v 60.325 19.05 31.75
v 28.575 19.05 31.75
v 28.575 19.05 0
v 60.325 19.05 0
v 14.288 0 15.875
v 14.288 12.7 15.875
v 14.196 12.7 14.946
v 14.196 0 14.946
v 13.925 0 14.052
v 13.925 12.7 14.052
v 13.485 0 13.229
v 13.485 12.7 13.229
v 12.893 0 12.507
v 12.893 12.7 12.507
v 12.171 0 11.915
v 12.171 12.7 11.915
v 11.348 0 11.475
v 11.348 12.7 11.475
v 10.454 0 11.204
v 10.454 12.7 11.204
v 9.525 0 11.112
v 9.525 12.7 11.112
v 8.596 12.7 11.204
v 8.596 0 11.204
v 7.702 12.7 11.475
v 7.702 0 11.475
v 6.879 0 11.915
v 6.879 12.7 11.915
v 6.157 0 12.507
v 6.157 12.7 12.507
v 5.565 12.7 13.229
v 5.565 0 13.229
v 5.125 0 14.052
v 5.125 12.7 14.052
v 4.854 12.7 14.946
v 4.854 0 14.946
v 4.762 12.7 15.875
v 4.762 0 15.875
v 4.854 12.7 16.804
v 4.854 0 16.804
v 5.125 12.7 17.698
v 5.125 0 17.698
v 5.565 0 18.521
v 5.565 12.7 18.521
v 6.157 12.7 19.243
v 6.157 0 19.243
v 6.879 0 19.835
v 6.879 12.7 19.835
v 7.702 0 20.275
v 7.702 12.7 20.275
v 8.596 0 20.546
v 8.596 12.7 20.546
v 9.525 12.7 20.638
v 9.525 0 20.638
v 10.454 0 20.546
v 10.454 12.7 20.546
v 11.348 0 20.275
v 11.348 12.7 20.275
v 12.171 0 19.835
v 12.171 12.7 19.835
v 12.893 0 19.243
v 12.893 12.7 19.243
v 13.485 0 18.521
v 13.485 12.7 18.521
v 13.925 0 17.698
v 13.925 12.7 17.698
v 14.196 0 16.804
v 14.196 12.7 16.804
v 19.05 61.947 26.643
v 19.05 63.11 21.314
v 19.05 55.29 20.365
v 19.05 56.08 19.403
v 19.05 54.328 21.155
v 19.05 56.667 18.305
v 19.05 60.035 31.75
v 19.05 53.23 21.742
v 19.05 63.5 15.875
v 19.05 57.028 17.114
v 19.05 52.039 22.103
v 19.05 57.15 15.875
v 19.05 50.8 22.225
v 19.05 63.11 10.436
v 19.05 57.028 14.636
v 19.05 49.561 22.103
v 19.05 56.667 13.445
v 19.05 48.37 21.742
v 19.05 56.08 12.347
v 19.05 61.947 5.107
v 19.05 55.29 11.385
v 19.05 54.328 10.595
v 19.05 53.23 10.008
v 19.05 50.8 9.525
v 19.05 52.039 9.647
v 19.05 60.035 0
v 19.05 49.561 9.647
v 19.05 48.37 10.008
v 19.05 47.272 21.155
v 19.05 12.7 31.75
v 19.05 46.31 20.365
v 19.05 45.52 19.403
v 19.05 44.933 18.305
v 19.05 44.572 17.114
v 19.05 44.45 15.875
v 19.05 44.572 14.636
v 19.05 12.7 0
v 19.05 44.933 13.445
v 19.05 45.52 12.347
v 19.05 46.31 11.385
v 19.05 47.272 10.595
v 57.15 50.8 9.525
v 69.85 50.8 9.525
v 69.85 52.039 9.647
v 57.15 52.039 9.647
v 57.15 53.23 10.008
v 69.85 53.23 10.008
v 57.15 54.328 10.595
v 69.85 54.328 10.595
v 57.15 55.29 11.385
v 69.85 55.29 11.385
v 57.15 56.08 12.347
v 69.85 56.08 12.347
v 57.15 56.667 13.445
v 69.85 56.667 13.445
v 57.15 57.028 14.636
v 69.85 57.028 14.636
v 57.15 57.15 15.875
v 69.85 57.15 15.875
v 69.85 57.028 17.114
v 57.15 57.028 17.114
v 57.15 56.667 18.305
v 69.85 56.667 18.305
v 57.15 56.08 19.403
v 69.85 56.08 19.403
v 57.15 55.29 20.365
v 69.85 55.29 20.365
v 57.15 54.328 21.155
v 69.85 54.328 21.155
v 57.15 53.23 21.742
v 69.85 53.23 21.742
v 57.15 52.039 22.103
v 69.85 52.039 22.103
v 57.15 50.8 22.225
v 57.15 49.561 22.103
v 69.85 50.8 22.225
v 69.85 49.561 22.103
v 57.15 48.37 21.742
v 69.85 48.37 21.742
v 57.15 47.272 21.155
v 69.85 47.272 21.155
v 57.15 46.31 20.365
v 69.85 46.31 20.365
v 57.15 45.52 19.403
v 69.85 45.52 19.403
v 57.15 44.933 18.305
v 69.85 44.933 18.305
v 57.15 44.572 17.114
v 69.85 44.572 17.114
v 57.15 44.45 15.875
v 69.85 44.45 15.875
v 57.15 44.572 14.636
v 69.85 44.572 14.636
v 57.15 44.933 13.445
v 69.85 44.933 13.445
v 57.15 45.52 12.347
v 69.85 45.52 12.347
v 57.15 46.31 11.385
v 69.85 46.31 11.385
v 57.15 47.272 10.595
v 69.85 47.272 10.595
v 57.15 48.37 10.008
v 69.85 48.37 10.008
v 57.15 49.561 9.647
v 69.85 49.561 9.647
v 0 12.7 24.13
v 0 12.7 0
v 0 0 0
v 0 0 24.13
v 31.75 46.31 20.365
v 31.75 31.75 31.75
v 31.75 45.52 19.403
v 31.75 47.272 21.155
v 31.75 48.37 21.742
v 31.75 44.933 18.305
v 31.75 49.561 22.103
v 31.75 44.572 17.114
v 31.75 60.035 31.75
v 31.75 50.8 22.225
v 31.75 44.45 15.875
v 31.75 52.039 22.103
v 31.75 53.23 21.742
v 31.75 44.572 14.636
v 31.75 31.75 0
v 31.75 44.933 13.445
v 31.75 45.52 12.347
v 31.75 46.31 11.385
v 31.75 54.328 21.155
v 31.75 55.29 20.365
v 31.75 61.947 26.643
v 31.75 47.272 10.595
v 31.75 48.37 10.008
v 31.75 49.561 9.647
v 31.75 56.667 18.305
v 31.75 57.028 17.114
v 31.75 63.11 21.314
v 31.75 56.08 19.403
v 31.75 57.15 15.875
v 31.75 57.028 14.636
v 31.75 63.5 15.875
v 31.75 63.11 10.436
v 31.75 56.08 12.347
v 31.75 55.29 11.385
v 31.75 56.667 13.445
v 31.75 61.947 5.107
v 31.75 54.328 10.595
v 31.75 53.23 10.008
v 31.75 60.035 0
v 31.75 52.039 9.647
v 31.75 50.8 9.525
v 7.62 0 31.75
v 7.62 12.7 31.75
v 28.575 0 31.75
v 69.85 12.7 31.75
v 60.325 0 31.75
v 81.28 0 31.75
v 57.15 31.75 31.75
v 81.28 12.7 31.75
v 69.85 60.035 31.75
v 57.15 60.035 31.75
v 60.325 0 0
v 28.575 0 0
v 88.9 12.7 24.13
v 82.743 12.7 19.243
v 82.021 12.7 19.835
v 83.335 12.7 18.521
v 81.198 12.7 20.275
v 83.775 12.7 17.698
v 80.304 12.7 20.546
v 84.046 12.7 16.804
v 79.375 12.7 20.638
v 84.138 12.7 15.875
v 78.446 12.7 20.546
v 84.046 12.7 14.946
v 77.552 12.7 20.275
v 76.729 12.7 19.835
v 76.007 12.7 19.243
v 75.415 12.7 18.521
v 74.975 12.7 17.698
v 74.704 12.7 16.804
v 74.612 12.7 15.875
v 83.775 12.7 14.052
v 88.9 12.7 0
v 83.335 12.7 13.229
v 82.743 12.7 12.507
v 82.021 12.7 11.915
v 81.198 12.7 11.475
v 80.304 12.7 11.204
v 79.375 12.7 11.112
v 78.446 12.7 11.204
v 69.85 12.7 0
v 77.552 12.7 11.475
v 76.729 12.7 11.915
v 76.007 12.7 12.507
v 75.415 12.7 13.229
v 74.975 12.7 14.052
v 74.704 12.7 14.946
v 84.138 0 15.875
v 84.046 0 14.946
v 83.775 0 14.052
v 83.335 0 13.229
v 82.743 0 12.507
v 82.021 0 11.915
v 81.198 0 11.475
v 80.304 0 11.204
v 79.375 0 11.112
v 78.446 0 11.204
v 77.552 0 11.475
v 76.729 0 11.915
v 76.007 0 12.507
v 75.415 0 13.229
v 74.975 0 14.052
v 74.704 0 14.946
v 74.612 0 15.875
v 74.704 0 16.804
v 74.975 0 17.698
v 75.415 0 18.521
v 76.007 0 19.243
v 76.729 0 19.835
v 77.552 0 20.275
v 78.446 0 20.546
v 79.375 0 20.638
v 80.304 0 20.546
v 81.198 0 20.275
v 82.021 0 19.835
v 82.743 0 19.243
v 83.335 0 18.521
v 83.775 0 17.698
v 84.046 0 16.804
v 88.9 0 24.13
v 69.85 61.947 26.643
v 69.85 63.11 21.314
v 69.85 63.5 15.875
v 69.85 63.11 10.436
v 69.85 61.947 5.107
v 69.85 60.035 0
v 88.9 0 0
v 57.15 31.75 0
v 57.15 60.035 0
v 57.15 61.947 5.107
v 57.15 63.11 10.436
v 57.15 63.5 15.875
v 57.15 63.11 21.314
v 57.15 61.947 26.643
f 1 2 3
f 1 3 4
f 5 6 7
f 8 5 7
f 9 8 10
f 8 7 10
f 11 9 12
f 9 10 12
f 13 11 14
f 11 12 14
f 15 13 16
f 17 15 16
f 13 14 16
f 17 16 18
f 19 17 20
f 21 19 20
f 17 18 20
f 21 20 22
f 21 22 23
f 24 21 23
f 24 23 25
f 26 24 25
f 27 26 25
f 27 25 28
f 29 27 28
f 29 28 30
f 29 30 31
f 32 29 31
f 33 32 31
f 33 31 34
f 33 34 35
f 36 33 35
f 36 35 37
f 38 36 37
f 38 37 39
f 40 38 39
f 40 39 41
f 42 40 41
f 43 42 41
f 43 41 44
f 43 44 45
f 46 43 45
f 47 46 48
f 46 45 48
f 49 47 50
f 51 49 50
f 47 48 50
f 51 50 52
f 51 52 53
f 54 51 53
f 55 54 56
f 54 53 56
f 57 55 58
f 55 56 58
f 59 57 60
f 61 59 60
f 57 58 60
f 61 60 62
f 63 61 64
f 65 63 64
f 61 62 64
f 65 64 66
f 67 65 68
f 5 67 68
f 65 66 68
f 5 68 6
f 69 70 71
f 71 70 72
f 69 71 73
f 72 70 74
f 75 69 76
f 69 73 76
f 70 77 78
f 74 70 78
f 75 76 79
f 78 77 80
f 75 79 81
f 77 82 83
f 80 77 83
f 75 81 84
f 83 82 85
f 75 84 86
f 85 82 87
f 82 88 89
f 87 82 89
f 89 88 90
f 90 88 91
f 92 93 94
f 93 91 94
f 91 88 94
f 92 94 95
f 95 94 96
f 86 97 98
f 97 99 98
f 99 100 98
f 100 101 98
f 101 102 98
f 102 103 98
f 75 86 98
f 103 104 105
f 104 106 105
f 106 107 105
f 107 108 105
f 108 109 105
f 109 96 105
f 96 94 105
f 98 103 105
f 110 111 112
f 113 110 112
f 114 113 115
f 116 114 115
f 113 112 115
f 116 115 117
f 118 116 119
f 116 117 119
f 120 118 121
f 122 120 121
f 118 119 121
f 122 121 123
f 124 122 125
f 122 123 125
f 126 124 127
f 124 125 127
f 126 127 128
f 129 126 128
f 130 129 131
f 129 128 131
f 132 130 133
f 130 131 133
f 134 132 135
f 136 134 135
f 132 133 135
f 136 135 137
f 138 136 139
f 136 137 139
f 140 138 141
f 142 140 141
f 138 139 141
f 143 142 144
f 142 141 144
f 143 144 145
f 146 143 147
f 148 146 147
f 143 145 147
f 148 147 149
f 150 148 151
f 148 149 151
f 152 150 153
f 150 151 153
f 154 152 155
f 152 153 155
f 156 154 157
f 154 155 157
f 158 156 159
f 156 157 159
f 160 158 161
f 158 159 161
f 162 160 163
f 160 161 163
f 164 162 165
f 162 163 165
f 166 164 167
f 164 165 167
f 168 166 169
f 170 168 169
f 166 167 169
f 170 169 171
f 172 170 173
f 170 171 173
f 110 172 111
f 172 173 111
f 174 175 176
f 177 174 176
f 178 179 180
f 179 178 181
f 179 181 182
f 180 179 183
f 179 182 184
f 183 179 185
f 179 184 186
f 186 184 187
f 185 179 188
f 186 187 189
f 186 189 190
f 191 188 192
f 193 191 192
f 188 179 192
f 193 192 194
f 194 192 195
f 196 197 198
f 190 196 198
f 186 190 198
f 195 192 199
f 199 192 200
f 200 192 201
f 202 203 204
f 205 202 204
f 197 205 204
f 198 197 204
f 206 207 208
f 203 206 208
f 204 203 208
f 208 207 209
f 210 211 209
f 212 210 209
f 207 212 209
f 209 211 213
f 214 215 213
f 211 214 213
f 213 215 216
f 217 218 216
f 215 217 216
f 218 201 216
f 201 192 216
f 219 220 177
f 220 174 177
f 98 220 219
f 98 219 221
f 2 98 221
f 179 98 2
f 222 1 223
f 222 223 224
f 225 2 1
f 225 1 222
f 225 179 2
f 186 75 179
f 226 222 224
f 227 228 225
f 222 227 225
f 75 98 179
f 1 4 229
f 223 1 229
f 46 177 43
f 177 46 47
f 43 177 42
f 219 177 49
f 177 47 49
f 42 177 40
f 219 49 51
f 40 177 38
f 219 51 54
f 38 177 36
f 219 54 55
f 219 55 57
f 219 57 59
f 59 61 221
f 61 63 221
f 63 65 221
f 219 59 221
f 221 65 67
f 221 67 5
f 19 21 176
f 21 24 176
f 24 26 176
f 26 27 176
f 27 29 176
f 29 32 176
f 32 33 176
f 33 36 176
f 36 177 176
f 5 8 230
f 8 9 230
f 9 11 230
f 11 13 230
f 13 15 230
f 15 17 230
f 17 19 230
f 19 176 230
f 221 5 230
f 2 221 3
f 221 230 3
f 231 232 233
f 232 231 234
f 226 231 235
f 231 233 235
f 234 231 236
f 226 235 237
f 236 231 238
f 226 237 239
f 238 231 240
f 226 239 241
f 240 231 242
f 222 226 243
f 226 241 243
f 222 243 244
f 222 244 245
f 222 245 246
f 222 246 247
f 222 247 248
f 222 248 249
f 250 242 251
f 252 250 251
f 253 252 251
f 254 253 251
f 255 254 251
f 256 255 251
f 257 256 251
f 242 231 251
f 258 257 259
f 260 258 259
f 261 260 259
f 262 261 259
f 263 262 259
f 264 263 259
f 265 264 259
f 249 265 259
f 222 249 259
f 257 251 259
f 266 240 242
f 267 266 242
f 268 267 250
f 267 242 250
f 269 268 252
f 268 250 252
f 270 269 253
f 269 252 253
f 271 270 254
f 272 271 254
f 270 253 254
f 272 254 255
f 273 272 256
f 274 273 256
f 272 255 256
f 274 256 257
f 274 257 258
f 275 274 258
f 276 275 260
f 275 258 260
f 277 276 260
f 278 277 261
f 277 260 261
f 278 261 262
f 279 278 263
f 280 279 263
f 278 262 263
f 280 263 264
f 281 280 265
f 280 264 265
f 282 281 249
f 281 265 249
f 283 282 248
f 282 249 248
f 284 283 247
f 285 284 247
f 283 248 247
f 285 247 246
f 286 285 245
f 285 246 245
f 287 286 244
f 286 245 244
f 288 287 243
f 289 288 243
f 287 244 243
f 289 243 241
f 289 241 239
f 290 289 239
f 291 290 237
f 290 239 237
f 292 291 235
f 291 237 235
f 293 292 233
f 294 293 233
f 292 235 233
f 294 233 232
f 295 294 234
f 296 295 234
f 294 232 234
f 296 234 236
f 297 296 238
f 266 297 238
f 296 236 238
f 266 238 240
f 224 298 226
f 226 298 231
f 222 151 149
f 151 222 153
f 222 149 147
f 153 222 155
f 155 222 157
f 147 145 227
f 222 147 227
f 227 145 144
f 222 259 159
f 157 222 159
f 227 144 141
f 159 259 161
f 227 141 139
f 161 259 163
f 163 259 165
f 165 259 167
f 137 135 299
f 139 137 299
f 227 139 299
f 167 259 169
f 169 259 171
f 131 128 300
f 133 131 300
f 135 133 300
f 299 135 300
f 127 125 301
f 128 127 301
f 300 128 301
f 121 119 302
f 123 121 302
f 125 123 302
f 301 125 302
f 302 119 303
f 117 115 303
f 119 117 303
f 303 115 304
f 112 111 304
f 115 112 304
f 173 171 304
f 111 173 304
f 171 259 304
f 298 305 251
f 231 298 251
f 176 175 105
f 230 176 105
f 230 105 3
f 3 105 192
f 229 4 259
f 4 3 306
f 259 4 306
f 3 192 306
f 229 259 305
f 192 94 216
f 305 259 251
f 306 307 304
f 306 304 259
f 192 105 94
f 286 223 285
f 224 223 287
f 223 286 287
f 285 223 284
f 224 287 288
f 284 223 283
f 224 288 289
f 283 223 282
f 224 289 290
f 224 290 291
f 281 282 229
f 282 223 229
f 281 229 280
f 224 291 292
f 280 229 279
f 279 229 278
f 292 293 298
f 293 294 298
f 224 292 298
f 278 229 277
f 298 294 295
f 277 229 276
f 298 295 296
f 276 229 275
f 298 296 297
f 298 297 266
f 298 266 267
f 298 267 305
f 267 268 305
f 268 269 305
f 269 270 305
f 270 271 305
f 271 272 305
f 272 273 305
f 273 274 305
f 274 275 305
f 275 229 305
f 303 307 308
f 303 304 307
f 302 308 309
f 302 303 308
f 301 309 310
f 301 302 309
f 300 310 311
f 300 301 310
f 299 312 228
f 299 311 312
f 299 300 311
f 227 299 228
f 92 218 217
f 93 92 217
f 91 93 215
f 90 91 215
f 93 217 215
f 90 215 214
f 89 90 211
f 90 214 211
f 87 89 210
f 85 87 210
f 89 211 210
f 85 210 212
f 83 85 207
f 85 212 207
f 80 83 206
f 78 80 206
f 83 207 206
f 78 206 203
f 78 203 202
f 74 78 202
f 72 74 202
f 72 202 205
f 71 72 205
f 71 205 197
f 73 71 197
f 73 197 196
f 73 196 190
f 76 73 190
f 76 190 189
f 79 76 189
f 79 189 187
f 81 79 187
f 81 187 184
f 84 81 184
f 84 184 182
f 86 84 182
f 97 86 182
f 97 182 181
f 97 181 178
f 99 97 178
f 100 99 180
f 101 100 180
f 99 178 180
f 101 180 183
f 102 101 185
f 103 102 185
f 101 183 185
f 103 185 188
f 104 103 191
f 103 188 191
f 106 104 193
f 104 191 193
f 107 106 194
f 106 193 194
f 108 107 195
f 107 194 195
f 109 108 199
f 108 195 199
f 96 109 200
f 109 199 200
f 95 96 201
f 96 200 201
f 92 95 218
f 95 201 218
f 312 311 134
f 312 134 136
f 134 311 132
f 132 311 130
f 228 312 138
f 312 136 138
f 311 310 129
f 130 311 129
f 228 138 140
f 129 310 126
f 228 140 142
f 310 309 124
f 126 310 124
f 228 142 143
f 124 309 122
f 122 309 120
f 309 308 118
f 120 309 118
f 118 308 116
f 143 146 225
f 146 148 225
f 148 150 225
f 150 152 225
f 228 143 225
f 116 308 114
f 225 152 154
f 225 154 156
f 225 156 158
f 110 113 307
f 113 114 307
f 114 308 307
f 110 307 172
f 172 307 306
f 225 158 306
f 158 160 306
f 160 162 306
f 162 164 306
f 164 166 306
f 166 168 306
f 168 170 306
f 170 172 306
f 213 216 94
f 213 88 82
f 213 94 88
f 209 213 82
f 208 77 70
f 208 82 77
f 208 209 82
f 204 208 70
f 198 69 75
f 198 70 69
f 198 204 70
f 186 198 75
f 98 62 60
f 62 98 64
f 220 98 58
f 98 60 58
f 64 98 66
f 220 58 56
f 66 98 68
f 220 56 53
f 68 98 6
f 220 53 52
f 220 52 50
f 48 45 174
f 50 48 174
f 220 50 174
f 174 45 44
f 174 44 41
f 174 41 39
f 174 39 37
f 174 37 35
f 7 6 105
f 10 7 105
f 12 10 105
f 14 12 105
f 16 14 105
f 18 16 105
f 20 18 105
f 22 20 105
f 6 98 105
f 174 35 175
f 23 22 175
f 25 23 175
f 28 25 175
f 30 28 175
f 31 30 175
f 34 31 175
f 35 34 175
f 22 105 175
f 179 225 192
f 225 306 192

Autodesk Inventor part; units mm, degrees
ref_plane "YZ Plane" through (0, 0, 0) normal (1, 0, 0) x (0, 1, 0)
ref_plane "XZ Plane" through (0, 0, 0) normal (0, 1, 0) x (-1, 0, 0)
ref_plane "XY Plane" through (0, 0, 0) normal (0, 0, 1) x (1, 0, 0)
sketch "Sketch1" plane through (0, 0, 0) normal (0, 0, 1) x (1, 0, 0)
  line L0 (0, 0) -> (28.575, 0)
  line L1 (28.575, 0) -> (28.575, 19.05)
  line L2 (28.575, 19.05) -> (60.325, 19.05)
  line L3 (60.325, 19.05) -> (60.325, 0)
  line L4 (60.325, 0) -> (88.9, 0)
  line L5 (88.9, 0) -> (88.9, 12.7)
  line L6 (88.9, 12.7) -> (69.85, 12.7)
  line L7 (69.85, 12.7) -> (69.85, 63.5)
  line L8 (69.85, 63.5) -> (57.15, 63.5)
  line L9 (57.15, 63.5) -> (57.15, 31.75)
  line L10 (57.15, 31.75) -> (31.75, 31.75)
  line L11 (31.75, 31.75) -> (31.75, 63.5)
  line L12 (31.75, 63.5) -> (19.05, 63.5)
  line L13 (19.05, 63.5) -> (19.05, 12.7)
  line L14 (19.05, 12.7) -> (0, 12.7)
  line L15 (0, 12.7) -> (0, 0)
  dimension "d0" = 19.05
  dimension "d1" = 31.75
  dimension "d2" = 12.7
  dimension "d3" = 25.4
  dimension "d4" = 88.9
  dimension "d5" = 50.8
  dimension "d6" = 19.05
  dimension "d7" = 12.7
extrude "Extrusion1" add sketch "Sketch1" along normal blind 31.75
sketch "Sketch2" plane through (69.85, 12.7, 0) normal (1, 0, 0) x (0, 0, -1)
  point P0 (0, -12.7)
sketch "Sketch3" plane through (69.85, 12.7, 0) normal (1, 0, 0) x (0, 0, -1)
  point P0 (0, -12.7)
sketch "Sketch4" plane through (69.85, 12.7, 0) normal (1, 0, 0) x (0, 0, -1)
  line L0 (0, 0) -> (0, 50.8) projected
  line L1 (-31.75, 0) -> (-31.75, 50.8) projected
  arc A0 (0, 47.3352) -> (-31.75, 47.3352) centre (-15.875, 12.7) ccw
  line L2 (0, 50.8) -> (-31.75, 50.8) projected
  line L3 (-31.75, 47.3352) -> (-31.75, 51.0727)
  line L4 (-31.75, 51.0727) -> (0, 51.0727)
  line L5 (0, 51.0727) -> (0, 47.3352)
  point P0 (0, -12.7)
  dimension "d10" = 38.1
extrude "Extrusion2" cut sketch "Sketch4" against normal through all
sketch "Sketch5" plane through (69.85, 12.7, 31.75) normal (1, 0, 0) x (0, 0, -1)
  circle A0 centre (15.875, 38.1) radius 6.35
  line L0 (31.75, 0) -> (31.75, 47.3352) projected
  line L1 (31.75, 0) -> (0, 0) projected
  point P0 (31.75, -12.7)
  dimension "d13" = 12.7
  dimension "d14" = 15.875
  dimension "d15" = 38.1
extrude "Extrusion3" cut sketch "Sketch5" against normal through all
chamfer "Chamfer1" distance 7.62 angle 45 1 edges at (88.9, 6.35, 31.75)
chamfer "Chamfer2" distance 7.62 angle 45 1 edges at (0, 6.35, 31.75)
sketch "Sketch7" plane through (69.85, 12.7, 0) normal (0, 1, 0) x (1, 0, 0)
  circle A0 centre (9.525, -15.875) radius 4.7625
  circle A1 centre (-60.325, -15.875) radius 4.7625
  line L0 (19.05, 0) -> (0, 0) projected
  line L1 (19.05, 0) -> (19.05, -24.13) projected
  line L2 (-50.8, 0) -> (-69.85, 0) projected
  line L3 (-69.85, 0) -> (-69.85, -24.13) projected
  dimension "d24" = 9.525
  dimension "d25" = 9.525
  dimension "d26" = 15.875
  dimension "d27" = 9.525
  dimension "d28" = 15.875
  dimension "d29" = 9.525
extrude "Extrusion4" cut sketch "Sketch7" against normal through all
equation "\"d0\" = 0.75 * d3"
equation "\"d1\" = 1.25 * d3"
equation "\"d2\" = 0.5 * d3"
equation "\"d4\" = 3.5 * d3"
equation "\"d5\" = 2 * d3"
equation "\"d6\" = 0.75 * d3"
equation "\"d7\" = 0.5 * d3"
equation "\"d25\" = d24"
equation "\"d28\" = d26"
equation "\"d29\" = d27"
properties part number "HW 5 Part 2"
